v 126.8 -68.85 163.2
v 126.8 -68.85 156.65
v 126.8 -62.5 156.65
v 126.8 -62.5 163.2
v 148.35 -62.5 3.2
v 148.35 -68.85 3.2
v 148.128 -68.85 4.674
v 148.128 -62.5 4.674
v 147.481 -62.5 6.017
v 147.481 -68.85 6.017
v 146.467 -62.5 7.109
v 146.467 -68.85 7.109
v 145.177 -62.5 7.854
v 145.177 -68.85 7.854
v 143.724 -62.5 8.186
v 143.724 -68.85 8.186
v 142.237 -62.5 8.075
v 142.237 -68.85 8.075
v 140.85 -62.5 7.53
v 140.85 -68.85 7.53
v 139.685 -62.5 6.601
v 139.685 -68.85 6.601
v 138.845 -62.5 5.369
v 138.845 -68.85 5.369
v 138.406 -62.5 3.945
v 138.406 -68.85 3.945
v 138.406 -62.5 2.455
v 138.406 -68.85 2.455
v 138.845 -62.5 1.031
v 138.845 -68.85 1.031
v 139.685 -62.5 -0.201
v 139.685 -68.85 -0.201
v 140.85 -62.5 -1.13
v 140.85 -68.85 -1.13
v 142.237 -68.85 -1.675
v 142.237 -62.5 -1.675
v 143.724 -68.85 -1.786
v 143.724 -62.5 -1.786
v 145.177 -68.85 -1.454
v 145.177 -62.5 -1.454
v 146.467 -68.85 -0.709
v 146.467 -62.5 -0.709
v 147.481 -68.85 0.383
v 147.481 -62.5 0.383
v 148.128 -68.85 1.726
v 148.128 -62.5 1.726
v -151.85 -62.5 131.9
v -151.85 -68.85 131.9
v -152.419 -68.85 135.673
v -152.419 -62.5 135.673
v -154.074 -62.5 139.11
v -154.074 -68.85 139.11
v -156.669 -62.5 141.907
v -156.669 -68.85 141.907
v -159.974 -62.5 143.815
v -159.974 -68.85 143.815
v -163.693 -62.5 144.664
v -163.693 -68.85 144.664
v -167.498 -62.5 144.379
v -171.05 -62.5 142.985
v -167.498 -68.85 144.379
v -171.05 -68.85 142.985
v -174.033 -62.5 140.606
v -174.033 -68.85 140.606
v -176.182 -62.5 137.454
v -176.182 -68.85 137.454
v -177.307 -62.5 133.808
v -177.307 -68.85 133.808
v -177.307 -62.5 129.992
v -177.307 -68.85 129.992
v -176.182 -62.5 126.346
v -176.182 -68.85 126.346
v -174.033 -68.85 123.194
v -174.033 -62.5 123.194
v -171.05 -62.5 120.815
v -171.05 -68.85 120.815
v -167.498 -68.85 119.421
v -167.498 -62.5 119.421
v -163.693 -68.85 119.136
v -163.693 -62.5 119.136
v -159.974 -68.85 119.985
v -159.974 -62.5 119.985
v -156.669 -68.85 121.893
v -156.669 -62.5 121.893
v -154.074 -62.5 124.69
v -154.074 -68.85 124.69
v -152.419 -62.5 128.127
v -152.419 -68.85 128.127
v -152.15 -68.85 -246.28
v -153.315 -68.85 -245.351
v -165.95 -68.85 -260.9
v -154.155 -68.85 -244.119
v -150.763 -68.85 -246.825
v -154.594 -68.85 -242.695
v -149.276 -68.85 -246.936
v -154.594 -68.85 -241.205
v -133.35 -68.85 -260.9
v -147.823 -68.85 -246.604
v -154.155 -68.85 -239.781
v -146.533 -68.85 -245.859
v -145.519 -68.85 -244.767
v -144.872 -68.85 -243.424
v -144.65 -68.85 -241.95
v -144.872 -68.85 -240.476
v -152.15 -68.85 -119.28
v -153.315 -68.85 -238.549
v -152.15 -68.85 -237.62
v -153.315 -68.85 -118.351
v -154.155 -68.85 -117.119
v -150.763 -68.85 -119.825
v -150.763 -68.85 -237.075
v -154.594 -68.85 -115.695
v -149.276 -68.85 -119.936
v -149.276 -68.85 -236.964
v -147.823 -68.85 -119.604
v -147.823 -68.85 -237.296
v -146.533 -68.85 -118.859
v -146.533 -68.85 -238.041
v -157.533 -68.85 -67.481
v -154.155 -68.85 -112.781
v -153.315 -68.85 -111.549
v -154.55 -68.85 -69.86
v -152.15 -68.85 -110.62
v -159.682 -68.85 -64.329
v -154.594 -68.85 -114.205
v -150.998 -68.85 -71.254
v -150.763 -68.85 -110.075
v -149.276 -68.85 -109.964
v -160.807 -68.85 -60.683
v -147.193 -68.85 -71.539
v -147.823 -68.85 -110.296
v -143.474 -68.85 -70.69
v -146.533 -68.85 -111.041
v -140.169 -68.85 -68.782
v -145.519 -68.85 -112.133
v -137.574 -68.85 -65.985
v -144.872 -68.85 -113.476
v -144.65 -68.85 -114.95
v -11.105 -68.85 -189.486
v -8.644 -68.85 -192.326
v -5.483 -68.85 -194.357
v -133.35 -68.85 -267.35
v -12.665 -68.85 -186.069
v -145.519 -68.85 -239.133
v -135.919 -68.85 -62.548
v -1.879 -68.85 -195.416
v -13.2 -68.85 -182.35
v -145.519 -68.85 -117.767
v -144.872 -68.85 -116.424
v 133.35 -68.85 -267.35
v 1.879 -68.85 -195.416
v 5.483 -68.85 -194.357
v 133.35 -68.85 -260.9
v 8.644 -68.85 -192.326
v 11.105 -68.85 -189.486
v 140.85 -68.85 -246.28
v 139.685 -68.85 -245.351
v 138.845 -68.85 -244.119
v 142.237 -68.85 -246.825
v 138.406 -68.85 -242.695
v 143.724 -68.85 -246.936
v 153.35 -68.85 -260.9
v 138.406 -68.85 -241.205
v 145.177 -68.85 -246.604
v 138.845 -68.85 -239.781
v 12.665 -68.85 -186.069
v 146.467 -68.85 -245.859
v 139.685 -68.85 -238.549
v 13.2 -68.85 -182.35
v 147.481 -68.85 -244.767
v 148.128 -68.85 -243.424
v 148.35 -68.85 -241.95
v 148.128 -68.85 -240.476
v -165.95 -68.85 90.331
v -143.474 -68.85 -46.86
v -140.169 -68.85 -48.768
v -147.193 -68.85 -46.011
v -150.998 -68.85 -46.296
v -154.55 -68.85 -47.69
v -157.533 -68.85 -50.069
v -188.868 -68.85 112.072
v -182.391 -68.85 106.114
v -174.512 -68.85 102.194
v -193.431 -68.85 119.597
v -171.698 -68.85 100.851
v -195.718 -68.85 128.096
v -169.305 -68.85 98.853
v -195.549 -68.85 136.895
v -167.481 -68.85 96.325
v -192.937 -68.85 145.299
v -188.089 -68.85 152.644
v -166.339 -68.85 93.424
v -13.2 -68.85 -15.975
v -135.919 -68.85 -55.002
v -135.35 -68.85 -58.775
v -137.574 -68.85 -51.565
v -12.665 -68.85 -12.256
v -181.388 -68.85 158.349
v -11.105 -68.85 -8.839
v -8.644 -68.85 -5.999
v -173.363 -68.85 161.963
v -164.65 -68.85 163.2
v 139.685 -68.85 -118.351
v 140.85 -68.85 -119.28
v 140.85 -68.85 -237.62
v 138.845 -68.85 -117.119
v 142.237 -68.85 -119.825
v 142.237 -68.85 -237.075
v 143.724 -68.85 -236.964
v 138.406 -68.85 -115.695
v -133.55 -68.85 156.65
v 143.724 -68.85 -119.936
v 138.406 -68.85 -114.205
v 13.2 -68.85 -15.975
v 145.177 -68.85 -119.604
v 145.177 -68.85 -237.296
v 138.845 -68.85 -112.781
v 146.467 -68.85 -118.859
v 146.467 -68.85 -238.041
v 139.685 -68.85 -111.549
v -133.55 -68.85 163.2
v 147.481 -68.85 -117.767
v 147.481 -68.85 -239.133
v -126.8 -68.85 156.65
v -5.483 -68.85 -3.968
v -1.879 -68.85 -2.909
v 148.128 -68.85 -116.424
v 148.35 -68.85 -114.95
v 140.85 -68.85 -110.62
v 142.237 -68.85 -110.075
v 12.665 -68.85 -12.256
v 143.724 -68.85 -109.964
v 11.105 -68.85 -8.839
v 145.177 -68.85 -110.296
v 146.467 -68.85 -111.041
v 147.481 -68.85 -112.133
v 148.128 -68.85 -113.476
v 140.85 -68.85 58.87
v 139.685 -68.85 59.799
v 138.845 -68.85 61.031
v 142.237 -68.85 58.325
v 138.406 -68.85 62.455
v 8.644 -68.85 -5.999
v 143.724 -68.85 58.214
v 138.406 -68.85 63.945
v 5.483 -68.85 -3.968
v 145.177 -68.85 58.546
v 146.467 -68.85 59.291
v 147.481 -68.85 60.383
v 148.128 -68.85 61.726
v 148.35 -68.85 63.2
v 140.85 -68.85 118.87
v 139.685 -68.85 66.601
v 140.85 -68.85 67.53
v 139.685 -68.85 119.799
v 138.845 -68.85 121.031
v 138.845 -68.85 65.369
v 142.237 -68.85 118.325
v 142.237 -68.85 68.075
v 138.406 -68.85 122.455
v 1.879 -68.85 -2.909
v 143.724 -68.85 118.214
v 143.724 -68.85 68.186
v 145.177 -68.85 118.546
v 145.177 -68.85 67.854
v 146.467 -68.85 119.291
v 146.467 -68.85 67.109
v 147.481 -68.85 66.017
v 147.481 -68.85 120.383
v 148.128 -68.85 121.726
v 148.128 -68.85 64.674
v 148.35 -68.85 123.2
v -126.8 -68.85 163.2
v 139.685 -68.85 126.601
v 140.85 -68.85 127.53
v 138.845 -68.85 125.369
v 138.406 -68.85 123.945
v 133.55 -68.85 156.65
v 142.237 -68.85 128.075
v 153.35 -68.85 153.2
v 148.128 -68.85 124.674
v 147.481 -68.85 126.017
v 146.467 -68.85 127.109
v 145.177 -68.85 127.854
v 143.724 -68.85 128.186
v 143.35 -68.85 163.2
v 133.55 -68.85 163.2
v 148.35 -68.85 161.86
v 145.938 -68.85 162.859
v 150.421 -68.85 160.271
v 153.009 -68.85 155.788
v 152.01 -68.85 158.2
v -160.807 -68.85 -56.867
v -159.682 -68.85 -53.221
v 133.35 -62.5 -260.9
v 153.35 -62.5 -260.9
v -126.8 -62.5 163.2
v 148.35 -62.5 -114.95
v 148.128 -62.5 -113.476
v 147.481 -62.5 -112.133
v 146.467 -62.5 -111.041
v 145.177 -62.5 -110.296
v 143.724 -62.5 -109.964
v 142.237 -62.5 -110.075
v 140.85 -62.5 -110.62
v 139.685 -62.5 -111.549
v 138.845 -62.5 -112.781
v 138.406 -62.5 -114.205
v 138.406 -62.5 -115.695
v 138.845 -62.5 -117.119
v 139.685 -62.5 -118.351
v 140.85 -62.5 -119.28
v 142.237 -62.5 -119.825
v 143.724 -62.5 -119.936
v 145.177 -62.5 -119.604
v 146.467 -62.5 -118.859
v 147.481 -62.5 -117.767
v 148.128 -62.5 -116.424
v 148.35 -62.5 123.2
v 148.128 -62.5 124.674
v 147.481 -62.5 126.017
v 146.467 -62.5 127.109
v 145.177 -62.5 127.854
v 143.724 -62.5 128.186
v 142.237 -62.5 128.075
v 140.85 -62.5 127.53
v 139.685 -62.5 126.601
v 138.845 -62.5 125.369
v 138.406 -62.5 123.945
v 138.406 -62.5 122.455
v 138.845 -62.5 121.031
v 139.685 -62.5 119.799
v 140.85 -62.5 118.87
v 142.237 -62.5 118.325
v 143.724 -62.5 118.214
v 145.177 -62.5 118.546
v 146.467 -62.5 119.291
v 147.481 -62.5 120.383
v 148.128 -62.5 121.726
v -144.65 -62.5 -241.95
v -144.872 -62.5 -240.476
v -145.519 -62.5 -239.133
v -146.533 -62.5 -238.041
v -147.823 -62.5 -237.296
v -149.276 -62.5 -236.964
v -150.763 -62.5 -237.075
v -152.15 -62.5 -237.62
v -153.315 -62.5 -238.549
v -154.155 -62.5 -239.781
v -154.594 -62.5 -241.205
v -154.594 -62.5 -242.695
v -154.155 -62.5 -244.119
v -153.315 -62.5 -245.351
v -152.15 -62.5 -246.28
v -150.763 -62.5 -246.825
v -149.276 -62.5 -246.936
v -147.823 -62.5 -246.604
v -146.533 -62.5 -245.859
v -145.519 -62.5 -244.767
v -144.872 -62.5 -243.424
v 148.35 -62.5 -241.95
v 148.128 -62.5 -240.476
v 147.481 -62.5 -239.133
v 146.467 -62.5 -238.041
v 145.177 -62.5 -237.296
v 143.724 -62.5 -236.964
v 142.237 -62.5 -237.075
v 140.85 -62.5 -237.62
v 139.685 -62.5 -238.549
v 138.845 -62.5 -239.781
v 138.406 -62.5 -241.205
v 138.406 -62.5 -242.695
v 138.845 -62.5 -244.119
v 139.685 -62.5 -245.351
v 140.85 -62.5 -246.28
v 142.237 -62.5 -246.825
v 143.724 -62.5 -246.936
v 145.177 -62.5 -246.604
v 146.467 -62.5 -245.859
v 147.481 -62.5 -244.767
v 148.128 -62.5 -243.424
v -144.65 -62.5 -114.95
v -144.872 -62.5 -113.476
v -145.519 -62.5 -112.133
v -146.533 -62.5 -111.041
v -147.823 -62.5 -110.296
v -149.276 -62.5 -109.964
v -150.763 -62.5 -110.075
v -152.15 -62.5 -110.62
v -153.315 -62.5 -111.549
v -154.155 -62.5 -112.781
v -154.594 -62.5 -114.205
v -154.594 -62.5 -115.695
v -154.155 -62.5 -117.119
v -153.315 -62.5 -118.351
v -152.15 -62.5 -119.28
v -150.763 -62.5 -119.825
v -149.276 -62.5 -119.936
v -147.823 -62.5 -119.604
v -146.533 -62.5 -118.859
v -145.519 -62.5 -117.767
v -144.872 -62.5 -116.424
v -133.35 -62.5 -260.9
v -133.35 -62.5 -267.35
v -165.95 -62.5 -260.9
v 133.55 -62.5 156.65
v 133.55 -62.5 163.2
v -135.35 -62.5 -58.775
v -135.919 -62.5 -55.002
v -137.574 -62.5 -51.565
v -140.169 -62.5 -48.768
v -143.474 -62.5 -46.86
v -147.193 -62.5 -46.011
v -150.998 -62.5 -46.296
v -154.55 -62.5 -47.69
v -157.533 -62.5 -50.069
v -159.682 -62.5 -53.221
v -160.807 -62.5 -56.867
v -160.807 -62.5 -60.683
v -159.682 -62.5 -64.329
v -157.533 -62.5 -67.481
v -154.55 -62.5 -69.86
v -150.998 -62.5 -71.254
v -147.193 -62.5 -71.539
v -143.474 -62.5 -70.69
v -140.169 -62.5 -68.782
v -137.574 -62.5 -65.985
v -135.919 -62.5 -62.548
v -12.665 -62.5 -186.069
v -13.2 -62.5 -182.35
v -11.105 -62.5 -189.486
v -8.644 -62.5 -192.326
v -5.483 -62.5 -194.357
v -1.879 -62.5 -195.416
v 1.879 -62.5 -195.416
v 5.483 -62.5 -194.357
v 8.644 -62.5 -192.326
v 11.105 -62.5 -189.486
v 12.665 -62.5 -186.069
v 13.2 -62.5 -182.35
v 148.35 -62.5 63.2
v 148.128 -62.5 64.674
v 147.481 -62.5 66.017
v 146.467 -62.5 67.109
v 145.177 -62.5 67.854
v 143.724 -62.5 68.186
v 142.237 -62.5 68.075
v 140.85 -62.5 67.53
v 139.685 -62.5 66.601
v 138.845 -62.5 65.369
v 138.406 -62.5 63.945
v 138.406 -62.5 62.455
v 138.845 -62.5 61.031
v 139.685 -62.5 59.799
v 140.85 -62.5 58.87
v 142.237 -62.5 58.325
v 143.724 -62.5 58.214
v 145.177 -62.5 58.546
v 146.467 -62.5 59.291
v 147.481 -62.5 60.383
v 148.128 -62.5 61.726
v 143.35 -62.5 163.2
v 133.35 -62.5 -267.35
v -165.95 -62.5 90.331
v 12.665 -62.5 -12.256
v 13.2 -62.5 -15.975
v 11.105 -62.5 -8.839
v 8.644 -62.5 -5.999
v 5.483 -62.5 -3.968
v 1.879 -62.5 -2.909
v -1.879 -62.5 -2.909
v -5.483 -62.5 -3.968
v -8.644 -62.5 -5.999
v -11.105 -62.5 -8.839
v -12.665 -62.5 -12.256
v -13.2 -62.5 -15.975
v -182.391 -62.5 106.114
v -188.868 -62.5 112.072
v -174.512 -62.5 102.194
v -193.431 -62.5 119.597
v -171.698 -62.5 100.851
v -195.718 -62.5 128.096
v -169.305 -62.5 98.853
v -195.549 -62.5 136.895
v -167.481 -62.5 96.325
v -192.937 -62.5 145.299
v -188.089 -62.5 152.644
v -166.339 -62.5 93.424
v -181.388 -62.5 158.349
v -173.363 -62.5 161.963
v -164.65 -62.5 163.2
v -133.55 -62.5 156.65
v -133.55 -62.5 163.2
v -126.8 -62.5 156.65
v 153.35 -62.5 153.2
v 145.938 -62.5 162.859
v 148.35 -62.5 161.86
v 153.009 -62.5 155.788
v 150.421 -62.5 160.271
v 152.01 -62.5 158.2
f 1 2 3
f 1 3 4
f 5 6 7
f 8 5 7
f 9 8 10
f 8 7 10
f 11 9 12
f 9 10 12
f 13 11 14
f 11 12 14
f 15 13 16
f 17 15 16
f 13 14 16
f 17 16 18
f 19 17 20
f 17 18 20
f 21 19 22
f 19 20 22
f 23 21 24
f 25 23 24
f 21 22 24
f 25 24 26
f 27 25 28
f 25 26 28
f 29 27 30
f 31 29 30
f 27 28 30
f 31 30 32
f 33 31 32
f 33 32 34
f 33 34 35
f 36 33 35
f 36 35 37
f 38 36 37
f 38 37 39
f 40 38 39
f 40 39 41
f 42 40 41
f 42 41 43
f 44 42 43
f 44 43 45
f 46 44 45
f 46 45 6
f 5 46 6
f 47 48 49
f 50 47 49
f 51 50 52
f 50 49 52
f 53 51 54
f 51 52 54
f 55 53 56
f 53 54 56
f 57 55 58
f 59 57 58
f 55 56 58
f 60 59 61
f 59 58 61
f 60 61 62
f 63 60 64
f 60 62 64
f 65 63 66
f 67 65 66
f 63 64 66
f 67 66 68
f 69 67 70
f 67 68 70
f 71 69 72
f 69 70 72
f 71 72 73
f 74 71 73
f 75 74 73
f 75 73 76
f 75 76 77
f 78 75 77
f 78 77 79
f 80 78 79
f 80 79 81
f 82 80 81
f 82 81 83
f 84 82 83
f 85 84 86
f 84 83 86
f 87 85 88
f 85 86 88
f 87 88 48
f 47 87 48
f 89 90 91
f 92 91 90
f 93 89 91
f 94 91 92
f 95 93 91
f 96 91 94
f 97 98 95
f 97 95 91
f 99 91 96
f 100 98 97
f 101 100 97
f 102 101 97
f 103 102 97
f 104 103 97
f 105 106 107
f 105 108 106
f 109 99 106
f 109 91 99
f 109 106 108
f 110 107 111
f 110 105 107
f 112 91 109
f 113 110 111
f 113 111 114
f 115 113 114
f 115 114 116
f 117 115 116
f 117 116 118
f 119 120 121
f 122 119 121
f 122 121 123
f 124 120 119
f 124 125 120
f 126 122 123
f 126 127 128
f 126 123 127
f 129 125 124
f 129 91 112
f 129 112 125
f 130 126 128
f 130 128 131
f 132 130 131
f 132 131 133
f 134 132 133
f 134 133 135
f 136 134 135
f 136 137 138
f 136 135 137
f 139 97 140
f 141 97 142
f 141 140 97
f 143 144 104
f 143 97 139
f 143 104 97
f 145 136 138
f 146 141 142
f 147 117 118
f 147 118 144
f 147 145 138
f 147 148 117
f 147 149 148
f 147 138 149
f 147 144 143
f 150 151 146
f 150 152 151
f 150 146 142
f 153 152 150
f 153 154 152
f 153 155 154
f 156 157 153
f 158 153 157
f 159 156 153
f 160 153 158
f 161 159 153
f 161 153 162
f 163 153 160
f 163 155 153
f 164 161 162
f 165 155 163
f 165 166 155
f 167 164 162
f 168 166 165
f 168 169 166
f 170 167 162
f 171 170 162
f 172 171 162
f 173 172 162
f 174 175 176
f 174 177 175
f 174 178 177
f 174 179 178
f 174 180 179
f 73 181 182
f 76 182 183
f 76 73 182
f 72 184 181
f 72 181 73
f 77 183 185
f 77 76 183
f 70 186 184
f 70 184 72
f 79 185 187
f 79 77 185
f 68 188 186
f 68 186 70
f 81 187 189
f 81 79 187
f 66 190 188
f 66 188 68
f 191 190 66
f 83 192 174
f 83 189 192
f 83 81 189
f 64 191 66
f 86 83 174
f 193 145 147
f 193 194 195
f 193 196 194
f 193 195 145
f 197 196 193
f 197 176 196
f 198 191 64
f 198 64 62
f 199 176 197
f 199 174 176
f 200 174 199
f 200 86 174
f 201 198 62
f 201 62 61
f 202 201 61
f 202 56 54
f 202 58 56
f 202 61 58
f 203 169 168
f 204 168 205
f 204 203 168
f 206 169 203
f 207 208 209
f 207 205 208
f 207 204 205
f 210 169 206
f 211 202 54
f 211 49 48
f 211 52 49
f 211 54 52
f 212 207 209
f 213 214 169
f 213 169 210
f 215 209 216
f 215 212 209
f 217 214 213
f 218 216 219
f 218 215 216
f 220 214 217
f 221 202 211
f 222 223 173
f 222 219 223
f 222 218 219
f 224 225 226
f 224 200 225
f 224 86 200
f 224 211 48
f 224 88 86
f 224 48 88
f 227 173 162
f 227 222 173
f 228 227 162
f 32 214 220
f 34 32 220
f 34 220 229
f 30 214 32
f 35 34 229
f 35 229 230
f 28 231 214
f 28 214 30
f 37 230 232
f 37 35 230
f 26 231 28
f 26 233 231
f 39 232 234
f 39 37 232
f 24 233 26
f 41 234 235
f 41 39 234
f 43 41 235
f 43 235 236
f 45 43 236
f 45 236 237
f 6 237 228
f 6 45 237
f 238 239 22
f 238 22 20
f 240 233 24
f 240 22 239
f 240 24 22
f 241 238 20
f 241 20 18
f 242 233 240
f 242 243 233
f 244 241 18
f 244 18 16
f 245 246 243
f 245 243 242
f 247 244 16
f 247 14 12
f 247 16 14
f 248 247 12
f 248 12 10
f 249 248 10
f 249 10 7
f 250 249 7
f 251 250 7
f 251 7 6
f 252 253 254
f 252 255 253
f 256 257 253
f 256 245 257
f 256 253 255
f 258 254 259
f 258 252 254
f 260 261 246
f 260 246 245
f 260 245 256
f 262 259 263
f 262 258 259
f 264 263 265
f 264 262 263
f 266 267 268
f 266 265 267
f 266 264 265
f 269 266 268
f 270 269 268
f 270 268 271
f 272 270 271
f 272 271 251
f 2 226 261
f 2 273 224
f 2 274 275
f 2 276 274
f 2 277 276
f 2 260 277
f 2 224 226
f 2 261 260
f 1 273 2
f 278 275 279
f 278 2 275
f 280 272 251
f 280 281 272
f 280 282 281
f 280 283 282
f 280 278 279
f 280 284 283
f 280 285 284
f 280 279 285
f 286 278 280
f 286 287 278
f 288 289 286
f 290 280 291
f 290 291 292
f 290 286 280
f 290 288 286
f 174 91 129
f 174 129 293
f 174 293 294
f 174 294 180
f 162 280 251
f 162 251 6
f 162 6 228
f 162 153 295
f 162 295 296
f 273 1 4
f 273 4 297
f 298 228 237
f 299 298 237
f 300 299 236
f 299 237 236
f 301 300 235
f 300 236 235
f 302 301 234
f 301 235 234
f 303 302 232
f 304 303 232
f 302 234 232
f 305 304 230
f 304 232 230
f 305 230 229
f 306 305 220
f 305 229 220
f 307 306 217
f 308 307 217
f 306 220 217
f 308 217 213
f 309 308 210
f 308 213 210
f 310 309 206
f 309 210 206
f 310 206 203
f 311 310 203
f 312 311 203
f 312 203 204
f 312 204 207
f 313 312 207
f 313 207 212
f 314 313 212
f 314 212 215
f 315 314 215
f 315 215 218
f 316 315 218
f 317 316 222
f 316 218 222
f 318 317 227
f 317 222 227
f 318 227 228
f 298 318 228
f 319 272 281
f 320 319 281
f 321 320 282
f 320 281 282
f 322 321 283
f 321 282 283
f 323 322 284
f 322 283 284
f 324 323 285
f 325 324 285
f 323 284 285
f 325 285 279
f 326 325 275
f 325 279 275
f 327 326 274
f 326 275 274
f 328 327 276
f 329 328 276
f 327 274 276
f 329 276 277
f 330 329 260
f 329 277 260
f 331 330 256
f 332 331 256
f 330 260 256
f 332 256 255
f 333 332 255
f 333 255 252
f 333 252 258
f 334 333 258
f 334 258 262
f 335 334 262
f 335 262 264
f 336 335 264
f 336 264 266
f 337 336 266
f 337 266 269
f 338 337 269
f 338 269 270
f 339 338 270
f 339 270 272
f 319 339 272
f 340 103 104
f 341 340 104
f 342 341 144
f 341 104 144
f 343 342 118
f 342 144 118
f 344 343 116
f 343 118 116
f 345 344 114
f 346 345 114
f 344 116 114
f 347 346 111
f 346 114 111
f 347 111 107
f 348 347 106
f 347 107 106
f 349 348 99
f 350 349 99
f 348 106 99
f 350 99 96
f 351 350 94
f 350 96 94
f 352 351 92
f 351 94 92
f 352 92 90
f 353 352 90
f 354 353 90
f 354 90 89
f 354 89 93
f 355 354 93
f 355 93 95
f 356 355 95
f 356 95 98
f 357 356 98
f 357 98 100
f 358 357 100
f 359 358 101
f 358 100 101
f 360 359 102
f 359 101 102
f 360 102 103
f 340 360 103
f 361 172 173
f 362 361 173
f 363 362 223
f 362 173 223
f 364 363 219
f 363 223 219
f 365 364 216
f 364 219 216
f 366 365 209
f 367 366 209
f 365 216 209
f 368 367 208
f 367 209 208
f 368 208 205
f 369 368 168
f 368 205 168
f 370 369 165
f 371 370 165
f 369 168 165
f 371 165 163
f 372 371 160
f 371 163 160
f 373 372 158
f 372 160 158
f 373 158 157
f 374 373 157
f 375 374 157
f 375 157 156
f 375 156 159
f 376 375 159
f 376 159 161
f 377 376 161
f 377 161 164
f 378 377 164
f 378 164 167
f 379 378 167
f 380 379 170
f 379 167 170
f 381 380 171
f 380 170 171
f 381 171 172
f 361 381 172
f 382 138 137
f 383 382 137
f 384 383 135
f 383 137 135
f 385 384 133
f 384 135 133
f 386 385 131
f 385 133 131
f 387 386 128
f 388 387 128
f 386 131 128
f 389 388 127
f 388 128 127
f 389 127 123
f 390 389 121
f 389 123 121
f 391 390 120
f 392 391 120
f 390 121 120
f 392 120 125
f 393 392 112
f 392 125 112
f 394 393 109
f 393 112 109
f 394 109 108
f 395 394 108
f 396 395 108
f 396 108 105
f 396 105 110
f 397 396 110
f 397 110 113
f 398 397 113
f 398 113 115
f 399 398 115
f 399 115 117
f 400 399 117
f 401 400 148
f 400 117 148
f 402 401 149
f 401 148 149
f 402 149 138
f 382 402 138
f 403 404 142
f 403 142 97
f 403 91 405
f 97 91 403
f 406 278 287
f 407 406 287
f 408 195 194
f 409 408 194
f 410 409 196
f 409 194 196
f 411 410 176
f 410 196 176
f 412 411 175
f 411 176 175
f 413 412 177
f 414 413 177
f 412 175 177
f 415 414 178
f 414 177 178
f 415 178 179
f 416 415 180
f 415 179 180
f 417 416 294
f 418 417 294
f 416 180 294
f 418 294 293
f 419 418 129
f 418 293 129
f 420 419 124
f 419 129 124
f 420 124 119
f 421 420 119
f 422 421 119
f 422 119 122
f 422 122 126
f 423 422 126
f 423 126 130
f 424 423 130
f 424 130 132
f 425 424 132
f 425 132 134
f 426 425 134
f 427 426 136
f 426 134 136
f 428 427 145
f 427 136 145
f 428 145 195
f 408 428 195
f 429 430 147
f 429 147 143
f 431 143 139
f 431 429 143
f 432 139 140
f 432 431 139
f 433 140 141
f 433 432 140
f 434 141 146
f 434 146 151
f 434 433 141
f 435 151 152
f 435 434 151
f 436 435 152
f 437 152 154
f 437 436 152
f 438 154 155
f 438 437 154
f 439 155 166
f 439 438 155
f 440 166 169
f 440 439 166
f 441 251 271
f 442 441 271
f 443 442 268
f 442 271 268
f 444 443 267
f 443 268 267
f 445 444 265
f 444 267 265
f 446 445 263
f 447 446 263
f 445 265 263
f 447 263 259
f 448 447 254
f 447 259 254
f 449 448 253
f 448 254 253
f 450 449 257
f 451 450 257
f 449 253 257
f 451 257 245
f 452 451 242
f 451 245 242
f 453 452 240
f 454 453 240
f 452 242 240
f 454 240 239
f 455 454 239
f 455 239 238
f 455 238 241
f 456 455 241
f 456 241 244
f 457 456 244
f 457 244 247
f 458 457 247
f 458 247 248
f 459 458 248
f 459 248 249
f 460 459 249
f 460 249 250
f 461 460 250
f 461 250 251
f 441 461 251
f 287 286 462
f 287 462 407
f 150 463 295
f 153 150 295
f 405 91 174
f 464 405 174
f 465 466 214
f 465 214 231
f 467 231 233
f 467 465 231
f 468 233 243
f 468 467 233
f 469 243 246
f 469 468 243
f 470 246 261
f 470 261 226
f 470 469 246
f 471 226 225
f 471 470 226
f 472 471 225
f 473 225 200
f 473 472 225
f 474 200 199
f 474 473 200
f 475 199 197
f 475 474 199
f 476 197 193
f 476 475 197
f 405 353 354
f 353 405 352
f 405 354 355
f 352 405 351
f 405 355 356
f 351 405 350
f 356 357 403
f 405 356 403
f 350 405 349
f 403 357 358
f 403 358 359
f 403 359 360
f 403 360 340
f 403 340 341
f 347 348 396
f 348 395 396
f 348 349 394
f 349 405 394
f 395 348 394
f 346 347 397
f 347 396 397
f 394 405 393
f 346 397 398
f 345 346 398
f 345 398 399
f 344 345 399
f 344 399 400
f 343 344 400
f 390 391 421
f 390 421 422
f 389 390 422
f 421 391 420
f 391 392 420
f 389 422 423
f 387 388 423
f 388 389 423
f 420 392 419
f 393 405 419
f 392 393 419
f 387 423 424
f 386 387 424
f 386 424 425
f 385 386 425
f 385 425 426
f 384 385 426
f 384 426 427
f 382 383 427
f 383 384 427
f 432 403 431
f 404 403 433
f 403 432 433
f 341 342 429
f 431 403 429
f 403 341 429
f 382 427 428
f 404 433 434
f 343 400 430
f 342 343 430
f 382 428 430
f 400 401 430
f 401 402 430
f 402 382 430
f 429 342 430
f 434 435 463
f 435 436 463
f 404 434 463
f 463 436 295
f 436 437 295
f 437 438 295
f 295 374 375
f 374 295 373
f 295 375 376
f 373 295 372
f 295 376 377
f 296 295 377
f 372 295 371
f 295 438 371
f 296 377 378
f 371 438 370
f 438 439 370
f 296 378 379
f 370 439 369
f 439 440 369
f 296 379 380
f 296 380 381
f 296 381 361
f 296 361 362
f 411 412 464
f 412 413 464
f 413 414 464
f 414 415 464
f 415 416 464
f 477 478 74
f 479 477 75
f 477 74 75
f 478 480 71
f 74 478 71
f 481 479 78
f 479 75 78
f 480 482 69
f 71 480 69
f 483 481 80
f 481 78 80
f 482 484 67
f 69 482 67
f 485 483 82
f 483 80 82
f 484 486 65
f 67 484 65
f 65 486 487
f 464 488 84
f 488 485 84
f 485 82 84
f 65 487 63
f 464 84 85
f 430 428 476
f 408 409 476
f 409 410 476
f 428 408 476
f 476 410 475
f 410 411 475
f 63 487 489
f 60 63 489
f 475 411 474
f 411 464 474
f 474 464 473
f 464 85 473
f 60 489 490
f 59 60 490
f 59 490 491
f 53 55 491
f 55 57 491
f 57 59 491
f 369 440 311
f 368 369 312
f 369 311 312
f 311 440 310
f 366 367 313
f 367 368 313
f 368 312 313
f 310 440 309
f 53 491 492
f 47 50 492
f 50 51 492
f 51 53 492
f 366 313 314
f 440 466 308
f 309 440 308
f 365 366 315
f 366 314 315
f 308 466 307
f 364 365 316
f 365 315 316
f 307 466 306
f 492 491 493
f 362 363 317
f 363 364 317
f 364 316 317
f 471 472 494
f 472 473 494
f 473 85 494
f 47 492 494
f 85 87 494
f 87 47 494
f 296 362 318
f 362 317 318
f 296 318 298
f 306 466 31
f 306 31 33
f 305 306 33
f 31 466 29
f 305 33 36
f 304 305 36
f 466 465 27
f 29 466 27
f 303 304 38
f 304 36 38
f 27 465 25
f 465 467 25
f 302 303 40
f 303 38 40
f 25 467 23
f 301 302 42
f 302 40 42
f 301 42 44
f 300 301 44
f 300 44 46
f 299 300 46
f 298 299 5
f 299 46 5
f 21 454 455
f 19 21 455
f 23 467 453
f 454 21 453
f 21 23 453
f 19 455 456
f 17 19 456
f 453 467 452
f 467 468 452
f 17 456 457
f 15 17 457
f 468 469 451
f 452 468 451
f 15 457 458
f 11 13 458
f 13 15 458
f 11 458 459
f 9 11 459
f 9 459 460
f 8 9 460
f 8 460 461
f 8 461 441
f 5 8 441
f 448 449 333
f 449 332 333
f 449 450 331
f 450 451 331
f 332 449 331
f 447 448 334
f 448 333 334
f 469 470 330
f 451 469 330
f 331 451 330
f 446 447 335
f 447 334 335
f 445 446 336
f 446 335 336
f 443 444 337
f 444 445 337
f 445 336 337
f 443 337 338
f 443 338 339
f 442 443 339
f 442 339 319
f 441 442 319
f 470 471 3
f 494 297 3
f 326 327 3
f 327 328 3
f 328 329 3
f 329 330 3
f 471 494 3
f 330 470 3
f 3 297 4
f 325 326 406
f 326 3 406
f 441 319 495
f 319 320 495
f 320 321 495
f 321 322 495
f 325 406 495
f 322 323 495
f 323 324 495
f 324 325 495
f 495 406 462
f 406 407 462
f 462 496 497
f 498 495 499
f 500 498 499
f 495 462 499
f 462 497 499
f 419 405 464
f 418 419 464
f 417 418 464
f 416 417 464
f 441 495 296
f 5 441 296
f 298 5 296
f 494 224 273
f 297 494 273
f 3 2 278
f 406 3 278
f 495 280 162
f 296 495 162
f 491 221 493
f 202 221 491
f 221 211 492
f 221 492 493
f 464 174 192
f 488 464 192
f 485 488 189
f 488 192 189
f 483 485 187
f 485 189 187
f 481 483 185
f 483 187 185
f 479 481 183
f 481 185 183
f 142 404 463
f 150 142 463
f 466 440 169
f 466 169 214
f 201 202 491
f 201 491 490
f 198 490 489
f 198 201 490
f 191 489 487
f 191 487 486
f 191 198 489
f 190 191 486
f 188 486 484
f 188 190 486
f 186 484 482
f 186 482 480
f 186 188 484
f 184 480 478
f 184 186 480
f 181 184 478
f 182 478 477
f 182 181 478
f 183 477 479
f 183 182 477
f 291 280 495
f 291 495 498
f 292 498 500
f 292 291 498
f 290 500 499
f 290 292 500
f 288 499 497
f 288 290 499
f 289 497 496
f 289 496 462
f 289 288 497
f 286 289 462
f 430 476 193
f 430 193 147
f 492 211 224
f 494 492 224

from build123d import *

# Parameters (mm, degrees)
SKETCH002_W     = 266.7
SKETCH002_H     = 430.55
PAD002_DEPTH    = 6.35
SKETCH020_R     = 12.8
SKETCH020_R_2   = 5
PAD014_DEPTH    = 6.35
SKETCH039_W     = 6.75
SKETCH039_H     = 6.55
POCKET_DEPTH    = 6.35
SKETCH056_R     = 5
POCKET002_DEPTH = 100


with BuildPart() as part:
    # Sketch002 (on Face1 of ShapeBinder002) → Pad002 (new body)
    with BuildSketch(Plane.XZ.offset(62.5)):
        with Locations((0, -52.075)):
            Rectangle(SKETCH002_W, SKETCH002_H)
        with BuildLine():
            ThreePointArc((-13.2, -182.35), (0, -195.55), (13.2, -182.35))
            Line((13.2, -182.35), (13.2, -15.975))
            ThreePointArc((13.2, -15.975), (0, -2.775), (-13.2, -15.975))
            Line((-13.2, -15.975), (-13.2, -182.35))
        make_face(mode=Mode.SUBTRACT)
    extrude(amount=PAD002_DEPTH)

    # Sketch020 (on Face10 of Pad002) → Pad014 (join)
    with BuildSketch(Plane.XZ.offset(68.85)):
        with BuildLine():
            Line((-133.35, 163.2), (-149.65, 163.2))
            Line((-164.65, 163.2), (-149.65, 163.2))
            ThreePointArc((-164.65, 163.2), (-195.548892, 136.894842), (-174.511666, 102.19415))
            ThreePointArc((-165.95, 90.330781), (-168.313946, 97.645862), (-174.511666, 102.19415))
            Line((-165.95, -260.9), (-165.95, 90.330781))
            Line((-165.95, -260.9), (-133.35, -260.9))
            Line((-133.35, 163.2), (-133.35, -260.9))
        make_face()
        with Locations((-148.15, -58.775)):
            Circle(SKETCH020_R, mode=Mode.SUBTRACT)
        with Locations((-149.65, -241.95)):
            Circle(SKETCH020_R_2, mode=Mode.SUBTRACT)
        with Locations((-149.65, -114.95)):
            Circle(SKETCH020_R_2, mode=Mode.SUBTRACT)
        with Locations((-164.65, 131.9)):
            Circle(SKETCH020_R, mode=Mode.SUBTRACT)
        with BuildLine():
            Line((133.35, 163.2), (143.35, 163.2))
            ThreePointArc((153.35, 153.2), (150.421068, 160.271068), (143.35, 163.2))
            Line((153.35, 153.2), (153.35, -260.9))
            Line((133.35, -260.9), (153.35, -260.9))
            Line((133.35, -260.9), (133.35, 163.2))
        make_face()
        with Locations((143.35, -241.95)):
            Circle(SKETCH020_R_2, mode=Mode.SUBTRACT)
        with Locations((143.35, -114.95)):
            Circle(SKETCH020_R_2, mode=Mode.SUBTRACT)
    extrude(amount=-PAD014_DEPTH)

    # Sketch039 (on Face22 of Pad014) → Pocket (cut)
    with BuildSketch(Plane.XZ.offset(68.85)):
        with Locations((-130.175, 159.925)):
            Rectangle(SKETCH039_W, SKETCH039_H)
        with Locations((130.175, 159.925)):
            Rectangle(SKETCH039_W, SKETCH039_H)
    extrude(amount=-POCKET_DEPTH, mode=Mode.SUBTRACT)

    # Sketch056 (on Face4 of Pocket) → Pocket002 (cut)
    with BuildSketch(Plane.XZ.offset(68.85)):
        with Locations((143.35, 123.2)):
            Circle(SKETCH056_R)
        with Locations((143.35, 63.2)):
            Circle(SKETCH056_R)
        with Locations((143.35, 3.2)):
            Circle(SKETCH056_R)
    extrude(amount=-POCKET002_DEPTH, mode=Mode.SUBTRACT)


solid = part.part
